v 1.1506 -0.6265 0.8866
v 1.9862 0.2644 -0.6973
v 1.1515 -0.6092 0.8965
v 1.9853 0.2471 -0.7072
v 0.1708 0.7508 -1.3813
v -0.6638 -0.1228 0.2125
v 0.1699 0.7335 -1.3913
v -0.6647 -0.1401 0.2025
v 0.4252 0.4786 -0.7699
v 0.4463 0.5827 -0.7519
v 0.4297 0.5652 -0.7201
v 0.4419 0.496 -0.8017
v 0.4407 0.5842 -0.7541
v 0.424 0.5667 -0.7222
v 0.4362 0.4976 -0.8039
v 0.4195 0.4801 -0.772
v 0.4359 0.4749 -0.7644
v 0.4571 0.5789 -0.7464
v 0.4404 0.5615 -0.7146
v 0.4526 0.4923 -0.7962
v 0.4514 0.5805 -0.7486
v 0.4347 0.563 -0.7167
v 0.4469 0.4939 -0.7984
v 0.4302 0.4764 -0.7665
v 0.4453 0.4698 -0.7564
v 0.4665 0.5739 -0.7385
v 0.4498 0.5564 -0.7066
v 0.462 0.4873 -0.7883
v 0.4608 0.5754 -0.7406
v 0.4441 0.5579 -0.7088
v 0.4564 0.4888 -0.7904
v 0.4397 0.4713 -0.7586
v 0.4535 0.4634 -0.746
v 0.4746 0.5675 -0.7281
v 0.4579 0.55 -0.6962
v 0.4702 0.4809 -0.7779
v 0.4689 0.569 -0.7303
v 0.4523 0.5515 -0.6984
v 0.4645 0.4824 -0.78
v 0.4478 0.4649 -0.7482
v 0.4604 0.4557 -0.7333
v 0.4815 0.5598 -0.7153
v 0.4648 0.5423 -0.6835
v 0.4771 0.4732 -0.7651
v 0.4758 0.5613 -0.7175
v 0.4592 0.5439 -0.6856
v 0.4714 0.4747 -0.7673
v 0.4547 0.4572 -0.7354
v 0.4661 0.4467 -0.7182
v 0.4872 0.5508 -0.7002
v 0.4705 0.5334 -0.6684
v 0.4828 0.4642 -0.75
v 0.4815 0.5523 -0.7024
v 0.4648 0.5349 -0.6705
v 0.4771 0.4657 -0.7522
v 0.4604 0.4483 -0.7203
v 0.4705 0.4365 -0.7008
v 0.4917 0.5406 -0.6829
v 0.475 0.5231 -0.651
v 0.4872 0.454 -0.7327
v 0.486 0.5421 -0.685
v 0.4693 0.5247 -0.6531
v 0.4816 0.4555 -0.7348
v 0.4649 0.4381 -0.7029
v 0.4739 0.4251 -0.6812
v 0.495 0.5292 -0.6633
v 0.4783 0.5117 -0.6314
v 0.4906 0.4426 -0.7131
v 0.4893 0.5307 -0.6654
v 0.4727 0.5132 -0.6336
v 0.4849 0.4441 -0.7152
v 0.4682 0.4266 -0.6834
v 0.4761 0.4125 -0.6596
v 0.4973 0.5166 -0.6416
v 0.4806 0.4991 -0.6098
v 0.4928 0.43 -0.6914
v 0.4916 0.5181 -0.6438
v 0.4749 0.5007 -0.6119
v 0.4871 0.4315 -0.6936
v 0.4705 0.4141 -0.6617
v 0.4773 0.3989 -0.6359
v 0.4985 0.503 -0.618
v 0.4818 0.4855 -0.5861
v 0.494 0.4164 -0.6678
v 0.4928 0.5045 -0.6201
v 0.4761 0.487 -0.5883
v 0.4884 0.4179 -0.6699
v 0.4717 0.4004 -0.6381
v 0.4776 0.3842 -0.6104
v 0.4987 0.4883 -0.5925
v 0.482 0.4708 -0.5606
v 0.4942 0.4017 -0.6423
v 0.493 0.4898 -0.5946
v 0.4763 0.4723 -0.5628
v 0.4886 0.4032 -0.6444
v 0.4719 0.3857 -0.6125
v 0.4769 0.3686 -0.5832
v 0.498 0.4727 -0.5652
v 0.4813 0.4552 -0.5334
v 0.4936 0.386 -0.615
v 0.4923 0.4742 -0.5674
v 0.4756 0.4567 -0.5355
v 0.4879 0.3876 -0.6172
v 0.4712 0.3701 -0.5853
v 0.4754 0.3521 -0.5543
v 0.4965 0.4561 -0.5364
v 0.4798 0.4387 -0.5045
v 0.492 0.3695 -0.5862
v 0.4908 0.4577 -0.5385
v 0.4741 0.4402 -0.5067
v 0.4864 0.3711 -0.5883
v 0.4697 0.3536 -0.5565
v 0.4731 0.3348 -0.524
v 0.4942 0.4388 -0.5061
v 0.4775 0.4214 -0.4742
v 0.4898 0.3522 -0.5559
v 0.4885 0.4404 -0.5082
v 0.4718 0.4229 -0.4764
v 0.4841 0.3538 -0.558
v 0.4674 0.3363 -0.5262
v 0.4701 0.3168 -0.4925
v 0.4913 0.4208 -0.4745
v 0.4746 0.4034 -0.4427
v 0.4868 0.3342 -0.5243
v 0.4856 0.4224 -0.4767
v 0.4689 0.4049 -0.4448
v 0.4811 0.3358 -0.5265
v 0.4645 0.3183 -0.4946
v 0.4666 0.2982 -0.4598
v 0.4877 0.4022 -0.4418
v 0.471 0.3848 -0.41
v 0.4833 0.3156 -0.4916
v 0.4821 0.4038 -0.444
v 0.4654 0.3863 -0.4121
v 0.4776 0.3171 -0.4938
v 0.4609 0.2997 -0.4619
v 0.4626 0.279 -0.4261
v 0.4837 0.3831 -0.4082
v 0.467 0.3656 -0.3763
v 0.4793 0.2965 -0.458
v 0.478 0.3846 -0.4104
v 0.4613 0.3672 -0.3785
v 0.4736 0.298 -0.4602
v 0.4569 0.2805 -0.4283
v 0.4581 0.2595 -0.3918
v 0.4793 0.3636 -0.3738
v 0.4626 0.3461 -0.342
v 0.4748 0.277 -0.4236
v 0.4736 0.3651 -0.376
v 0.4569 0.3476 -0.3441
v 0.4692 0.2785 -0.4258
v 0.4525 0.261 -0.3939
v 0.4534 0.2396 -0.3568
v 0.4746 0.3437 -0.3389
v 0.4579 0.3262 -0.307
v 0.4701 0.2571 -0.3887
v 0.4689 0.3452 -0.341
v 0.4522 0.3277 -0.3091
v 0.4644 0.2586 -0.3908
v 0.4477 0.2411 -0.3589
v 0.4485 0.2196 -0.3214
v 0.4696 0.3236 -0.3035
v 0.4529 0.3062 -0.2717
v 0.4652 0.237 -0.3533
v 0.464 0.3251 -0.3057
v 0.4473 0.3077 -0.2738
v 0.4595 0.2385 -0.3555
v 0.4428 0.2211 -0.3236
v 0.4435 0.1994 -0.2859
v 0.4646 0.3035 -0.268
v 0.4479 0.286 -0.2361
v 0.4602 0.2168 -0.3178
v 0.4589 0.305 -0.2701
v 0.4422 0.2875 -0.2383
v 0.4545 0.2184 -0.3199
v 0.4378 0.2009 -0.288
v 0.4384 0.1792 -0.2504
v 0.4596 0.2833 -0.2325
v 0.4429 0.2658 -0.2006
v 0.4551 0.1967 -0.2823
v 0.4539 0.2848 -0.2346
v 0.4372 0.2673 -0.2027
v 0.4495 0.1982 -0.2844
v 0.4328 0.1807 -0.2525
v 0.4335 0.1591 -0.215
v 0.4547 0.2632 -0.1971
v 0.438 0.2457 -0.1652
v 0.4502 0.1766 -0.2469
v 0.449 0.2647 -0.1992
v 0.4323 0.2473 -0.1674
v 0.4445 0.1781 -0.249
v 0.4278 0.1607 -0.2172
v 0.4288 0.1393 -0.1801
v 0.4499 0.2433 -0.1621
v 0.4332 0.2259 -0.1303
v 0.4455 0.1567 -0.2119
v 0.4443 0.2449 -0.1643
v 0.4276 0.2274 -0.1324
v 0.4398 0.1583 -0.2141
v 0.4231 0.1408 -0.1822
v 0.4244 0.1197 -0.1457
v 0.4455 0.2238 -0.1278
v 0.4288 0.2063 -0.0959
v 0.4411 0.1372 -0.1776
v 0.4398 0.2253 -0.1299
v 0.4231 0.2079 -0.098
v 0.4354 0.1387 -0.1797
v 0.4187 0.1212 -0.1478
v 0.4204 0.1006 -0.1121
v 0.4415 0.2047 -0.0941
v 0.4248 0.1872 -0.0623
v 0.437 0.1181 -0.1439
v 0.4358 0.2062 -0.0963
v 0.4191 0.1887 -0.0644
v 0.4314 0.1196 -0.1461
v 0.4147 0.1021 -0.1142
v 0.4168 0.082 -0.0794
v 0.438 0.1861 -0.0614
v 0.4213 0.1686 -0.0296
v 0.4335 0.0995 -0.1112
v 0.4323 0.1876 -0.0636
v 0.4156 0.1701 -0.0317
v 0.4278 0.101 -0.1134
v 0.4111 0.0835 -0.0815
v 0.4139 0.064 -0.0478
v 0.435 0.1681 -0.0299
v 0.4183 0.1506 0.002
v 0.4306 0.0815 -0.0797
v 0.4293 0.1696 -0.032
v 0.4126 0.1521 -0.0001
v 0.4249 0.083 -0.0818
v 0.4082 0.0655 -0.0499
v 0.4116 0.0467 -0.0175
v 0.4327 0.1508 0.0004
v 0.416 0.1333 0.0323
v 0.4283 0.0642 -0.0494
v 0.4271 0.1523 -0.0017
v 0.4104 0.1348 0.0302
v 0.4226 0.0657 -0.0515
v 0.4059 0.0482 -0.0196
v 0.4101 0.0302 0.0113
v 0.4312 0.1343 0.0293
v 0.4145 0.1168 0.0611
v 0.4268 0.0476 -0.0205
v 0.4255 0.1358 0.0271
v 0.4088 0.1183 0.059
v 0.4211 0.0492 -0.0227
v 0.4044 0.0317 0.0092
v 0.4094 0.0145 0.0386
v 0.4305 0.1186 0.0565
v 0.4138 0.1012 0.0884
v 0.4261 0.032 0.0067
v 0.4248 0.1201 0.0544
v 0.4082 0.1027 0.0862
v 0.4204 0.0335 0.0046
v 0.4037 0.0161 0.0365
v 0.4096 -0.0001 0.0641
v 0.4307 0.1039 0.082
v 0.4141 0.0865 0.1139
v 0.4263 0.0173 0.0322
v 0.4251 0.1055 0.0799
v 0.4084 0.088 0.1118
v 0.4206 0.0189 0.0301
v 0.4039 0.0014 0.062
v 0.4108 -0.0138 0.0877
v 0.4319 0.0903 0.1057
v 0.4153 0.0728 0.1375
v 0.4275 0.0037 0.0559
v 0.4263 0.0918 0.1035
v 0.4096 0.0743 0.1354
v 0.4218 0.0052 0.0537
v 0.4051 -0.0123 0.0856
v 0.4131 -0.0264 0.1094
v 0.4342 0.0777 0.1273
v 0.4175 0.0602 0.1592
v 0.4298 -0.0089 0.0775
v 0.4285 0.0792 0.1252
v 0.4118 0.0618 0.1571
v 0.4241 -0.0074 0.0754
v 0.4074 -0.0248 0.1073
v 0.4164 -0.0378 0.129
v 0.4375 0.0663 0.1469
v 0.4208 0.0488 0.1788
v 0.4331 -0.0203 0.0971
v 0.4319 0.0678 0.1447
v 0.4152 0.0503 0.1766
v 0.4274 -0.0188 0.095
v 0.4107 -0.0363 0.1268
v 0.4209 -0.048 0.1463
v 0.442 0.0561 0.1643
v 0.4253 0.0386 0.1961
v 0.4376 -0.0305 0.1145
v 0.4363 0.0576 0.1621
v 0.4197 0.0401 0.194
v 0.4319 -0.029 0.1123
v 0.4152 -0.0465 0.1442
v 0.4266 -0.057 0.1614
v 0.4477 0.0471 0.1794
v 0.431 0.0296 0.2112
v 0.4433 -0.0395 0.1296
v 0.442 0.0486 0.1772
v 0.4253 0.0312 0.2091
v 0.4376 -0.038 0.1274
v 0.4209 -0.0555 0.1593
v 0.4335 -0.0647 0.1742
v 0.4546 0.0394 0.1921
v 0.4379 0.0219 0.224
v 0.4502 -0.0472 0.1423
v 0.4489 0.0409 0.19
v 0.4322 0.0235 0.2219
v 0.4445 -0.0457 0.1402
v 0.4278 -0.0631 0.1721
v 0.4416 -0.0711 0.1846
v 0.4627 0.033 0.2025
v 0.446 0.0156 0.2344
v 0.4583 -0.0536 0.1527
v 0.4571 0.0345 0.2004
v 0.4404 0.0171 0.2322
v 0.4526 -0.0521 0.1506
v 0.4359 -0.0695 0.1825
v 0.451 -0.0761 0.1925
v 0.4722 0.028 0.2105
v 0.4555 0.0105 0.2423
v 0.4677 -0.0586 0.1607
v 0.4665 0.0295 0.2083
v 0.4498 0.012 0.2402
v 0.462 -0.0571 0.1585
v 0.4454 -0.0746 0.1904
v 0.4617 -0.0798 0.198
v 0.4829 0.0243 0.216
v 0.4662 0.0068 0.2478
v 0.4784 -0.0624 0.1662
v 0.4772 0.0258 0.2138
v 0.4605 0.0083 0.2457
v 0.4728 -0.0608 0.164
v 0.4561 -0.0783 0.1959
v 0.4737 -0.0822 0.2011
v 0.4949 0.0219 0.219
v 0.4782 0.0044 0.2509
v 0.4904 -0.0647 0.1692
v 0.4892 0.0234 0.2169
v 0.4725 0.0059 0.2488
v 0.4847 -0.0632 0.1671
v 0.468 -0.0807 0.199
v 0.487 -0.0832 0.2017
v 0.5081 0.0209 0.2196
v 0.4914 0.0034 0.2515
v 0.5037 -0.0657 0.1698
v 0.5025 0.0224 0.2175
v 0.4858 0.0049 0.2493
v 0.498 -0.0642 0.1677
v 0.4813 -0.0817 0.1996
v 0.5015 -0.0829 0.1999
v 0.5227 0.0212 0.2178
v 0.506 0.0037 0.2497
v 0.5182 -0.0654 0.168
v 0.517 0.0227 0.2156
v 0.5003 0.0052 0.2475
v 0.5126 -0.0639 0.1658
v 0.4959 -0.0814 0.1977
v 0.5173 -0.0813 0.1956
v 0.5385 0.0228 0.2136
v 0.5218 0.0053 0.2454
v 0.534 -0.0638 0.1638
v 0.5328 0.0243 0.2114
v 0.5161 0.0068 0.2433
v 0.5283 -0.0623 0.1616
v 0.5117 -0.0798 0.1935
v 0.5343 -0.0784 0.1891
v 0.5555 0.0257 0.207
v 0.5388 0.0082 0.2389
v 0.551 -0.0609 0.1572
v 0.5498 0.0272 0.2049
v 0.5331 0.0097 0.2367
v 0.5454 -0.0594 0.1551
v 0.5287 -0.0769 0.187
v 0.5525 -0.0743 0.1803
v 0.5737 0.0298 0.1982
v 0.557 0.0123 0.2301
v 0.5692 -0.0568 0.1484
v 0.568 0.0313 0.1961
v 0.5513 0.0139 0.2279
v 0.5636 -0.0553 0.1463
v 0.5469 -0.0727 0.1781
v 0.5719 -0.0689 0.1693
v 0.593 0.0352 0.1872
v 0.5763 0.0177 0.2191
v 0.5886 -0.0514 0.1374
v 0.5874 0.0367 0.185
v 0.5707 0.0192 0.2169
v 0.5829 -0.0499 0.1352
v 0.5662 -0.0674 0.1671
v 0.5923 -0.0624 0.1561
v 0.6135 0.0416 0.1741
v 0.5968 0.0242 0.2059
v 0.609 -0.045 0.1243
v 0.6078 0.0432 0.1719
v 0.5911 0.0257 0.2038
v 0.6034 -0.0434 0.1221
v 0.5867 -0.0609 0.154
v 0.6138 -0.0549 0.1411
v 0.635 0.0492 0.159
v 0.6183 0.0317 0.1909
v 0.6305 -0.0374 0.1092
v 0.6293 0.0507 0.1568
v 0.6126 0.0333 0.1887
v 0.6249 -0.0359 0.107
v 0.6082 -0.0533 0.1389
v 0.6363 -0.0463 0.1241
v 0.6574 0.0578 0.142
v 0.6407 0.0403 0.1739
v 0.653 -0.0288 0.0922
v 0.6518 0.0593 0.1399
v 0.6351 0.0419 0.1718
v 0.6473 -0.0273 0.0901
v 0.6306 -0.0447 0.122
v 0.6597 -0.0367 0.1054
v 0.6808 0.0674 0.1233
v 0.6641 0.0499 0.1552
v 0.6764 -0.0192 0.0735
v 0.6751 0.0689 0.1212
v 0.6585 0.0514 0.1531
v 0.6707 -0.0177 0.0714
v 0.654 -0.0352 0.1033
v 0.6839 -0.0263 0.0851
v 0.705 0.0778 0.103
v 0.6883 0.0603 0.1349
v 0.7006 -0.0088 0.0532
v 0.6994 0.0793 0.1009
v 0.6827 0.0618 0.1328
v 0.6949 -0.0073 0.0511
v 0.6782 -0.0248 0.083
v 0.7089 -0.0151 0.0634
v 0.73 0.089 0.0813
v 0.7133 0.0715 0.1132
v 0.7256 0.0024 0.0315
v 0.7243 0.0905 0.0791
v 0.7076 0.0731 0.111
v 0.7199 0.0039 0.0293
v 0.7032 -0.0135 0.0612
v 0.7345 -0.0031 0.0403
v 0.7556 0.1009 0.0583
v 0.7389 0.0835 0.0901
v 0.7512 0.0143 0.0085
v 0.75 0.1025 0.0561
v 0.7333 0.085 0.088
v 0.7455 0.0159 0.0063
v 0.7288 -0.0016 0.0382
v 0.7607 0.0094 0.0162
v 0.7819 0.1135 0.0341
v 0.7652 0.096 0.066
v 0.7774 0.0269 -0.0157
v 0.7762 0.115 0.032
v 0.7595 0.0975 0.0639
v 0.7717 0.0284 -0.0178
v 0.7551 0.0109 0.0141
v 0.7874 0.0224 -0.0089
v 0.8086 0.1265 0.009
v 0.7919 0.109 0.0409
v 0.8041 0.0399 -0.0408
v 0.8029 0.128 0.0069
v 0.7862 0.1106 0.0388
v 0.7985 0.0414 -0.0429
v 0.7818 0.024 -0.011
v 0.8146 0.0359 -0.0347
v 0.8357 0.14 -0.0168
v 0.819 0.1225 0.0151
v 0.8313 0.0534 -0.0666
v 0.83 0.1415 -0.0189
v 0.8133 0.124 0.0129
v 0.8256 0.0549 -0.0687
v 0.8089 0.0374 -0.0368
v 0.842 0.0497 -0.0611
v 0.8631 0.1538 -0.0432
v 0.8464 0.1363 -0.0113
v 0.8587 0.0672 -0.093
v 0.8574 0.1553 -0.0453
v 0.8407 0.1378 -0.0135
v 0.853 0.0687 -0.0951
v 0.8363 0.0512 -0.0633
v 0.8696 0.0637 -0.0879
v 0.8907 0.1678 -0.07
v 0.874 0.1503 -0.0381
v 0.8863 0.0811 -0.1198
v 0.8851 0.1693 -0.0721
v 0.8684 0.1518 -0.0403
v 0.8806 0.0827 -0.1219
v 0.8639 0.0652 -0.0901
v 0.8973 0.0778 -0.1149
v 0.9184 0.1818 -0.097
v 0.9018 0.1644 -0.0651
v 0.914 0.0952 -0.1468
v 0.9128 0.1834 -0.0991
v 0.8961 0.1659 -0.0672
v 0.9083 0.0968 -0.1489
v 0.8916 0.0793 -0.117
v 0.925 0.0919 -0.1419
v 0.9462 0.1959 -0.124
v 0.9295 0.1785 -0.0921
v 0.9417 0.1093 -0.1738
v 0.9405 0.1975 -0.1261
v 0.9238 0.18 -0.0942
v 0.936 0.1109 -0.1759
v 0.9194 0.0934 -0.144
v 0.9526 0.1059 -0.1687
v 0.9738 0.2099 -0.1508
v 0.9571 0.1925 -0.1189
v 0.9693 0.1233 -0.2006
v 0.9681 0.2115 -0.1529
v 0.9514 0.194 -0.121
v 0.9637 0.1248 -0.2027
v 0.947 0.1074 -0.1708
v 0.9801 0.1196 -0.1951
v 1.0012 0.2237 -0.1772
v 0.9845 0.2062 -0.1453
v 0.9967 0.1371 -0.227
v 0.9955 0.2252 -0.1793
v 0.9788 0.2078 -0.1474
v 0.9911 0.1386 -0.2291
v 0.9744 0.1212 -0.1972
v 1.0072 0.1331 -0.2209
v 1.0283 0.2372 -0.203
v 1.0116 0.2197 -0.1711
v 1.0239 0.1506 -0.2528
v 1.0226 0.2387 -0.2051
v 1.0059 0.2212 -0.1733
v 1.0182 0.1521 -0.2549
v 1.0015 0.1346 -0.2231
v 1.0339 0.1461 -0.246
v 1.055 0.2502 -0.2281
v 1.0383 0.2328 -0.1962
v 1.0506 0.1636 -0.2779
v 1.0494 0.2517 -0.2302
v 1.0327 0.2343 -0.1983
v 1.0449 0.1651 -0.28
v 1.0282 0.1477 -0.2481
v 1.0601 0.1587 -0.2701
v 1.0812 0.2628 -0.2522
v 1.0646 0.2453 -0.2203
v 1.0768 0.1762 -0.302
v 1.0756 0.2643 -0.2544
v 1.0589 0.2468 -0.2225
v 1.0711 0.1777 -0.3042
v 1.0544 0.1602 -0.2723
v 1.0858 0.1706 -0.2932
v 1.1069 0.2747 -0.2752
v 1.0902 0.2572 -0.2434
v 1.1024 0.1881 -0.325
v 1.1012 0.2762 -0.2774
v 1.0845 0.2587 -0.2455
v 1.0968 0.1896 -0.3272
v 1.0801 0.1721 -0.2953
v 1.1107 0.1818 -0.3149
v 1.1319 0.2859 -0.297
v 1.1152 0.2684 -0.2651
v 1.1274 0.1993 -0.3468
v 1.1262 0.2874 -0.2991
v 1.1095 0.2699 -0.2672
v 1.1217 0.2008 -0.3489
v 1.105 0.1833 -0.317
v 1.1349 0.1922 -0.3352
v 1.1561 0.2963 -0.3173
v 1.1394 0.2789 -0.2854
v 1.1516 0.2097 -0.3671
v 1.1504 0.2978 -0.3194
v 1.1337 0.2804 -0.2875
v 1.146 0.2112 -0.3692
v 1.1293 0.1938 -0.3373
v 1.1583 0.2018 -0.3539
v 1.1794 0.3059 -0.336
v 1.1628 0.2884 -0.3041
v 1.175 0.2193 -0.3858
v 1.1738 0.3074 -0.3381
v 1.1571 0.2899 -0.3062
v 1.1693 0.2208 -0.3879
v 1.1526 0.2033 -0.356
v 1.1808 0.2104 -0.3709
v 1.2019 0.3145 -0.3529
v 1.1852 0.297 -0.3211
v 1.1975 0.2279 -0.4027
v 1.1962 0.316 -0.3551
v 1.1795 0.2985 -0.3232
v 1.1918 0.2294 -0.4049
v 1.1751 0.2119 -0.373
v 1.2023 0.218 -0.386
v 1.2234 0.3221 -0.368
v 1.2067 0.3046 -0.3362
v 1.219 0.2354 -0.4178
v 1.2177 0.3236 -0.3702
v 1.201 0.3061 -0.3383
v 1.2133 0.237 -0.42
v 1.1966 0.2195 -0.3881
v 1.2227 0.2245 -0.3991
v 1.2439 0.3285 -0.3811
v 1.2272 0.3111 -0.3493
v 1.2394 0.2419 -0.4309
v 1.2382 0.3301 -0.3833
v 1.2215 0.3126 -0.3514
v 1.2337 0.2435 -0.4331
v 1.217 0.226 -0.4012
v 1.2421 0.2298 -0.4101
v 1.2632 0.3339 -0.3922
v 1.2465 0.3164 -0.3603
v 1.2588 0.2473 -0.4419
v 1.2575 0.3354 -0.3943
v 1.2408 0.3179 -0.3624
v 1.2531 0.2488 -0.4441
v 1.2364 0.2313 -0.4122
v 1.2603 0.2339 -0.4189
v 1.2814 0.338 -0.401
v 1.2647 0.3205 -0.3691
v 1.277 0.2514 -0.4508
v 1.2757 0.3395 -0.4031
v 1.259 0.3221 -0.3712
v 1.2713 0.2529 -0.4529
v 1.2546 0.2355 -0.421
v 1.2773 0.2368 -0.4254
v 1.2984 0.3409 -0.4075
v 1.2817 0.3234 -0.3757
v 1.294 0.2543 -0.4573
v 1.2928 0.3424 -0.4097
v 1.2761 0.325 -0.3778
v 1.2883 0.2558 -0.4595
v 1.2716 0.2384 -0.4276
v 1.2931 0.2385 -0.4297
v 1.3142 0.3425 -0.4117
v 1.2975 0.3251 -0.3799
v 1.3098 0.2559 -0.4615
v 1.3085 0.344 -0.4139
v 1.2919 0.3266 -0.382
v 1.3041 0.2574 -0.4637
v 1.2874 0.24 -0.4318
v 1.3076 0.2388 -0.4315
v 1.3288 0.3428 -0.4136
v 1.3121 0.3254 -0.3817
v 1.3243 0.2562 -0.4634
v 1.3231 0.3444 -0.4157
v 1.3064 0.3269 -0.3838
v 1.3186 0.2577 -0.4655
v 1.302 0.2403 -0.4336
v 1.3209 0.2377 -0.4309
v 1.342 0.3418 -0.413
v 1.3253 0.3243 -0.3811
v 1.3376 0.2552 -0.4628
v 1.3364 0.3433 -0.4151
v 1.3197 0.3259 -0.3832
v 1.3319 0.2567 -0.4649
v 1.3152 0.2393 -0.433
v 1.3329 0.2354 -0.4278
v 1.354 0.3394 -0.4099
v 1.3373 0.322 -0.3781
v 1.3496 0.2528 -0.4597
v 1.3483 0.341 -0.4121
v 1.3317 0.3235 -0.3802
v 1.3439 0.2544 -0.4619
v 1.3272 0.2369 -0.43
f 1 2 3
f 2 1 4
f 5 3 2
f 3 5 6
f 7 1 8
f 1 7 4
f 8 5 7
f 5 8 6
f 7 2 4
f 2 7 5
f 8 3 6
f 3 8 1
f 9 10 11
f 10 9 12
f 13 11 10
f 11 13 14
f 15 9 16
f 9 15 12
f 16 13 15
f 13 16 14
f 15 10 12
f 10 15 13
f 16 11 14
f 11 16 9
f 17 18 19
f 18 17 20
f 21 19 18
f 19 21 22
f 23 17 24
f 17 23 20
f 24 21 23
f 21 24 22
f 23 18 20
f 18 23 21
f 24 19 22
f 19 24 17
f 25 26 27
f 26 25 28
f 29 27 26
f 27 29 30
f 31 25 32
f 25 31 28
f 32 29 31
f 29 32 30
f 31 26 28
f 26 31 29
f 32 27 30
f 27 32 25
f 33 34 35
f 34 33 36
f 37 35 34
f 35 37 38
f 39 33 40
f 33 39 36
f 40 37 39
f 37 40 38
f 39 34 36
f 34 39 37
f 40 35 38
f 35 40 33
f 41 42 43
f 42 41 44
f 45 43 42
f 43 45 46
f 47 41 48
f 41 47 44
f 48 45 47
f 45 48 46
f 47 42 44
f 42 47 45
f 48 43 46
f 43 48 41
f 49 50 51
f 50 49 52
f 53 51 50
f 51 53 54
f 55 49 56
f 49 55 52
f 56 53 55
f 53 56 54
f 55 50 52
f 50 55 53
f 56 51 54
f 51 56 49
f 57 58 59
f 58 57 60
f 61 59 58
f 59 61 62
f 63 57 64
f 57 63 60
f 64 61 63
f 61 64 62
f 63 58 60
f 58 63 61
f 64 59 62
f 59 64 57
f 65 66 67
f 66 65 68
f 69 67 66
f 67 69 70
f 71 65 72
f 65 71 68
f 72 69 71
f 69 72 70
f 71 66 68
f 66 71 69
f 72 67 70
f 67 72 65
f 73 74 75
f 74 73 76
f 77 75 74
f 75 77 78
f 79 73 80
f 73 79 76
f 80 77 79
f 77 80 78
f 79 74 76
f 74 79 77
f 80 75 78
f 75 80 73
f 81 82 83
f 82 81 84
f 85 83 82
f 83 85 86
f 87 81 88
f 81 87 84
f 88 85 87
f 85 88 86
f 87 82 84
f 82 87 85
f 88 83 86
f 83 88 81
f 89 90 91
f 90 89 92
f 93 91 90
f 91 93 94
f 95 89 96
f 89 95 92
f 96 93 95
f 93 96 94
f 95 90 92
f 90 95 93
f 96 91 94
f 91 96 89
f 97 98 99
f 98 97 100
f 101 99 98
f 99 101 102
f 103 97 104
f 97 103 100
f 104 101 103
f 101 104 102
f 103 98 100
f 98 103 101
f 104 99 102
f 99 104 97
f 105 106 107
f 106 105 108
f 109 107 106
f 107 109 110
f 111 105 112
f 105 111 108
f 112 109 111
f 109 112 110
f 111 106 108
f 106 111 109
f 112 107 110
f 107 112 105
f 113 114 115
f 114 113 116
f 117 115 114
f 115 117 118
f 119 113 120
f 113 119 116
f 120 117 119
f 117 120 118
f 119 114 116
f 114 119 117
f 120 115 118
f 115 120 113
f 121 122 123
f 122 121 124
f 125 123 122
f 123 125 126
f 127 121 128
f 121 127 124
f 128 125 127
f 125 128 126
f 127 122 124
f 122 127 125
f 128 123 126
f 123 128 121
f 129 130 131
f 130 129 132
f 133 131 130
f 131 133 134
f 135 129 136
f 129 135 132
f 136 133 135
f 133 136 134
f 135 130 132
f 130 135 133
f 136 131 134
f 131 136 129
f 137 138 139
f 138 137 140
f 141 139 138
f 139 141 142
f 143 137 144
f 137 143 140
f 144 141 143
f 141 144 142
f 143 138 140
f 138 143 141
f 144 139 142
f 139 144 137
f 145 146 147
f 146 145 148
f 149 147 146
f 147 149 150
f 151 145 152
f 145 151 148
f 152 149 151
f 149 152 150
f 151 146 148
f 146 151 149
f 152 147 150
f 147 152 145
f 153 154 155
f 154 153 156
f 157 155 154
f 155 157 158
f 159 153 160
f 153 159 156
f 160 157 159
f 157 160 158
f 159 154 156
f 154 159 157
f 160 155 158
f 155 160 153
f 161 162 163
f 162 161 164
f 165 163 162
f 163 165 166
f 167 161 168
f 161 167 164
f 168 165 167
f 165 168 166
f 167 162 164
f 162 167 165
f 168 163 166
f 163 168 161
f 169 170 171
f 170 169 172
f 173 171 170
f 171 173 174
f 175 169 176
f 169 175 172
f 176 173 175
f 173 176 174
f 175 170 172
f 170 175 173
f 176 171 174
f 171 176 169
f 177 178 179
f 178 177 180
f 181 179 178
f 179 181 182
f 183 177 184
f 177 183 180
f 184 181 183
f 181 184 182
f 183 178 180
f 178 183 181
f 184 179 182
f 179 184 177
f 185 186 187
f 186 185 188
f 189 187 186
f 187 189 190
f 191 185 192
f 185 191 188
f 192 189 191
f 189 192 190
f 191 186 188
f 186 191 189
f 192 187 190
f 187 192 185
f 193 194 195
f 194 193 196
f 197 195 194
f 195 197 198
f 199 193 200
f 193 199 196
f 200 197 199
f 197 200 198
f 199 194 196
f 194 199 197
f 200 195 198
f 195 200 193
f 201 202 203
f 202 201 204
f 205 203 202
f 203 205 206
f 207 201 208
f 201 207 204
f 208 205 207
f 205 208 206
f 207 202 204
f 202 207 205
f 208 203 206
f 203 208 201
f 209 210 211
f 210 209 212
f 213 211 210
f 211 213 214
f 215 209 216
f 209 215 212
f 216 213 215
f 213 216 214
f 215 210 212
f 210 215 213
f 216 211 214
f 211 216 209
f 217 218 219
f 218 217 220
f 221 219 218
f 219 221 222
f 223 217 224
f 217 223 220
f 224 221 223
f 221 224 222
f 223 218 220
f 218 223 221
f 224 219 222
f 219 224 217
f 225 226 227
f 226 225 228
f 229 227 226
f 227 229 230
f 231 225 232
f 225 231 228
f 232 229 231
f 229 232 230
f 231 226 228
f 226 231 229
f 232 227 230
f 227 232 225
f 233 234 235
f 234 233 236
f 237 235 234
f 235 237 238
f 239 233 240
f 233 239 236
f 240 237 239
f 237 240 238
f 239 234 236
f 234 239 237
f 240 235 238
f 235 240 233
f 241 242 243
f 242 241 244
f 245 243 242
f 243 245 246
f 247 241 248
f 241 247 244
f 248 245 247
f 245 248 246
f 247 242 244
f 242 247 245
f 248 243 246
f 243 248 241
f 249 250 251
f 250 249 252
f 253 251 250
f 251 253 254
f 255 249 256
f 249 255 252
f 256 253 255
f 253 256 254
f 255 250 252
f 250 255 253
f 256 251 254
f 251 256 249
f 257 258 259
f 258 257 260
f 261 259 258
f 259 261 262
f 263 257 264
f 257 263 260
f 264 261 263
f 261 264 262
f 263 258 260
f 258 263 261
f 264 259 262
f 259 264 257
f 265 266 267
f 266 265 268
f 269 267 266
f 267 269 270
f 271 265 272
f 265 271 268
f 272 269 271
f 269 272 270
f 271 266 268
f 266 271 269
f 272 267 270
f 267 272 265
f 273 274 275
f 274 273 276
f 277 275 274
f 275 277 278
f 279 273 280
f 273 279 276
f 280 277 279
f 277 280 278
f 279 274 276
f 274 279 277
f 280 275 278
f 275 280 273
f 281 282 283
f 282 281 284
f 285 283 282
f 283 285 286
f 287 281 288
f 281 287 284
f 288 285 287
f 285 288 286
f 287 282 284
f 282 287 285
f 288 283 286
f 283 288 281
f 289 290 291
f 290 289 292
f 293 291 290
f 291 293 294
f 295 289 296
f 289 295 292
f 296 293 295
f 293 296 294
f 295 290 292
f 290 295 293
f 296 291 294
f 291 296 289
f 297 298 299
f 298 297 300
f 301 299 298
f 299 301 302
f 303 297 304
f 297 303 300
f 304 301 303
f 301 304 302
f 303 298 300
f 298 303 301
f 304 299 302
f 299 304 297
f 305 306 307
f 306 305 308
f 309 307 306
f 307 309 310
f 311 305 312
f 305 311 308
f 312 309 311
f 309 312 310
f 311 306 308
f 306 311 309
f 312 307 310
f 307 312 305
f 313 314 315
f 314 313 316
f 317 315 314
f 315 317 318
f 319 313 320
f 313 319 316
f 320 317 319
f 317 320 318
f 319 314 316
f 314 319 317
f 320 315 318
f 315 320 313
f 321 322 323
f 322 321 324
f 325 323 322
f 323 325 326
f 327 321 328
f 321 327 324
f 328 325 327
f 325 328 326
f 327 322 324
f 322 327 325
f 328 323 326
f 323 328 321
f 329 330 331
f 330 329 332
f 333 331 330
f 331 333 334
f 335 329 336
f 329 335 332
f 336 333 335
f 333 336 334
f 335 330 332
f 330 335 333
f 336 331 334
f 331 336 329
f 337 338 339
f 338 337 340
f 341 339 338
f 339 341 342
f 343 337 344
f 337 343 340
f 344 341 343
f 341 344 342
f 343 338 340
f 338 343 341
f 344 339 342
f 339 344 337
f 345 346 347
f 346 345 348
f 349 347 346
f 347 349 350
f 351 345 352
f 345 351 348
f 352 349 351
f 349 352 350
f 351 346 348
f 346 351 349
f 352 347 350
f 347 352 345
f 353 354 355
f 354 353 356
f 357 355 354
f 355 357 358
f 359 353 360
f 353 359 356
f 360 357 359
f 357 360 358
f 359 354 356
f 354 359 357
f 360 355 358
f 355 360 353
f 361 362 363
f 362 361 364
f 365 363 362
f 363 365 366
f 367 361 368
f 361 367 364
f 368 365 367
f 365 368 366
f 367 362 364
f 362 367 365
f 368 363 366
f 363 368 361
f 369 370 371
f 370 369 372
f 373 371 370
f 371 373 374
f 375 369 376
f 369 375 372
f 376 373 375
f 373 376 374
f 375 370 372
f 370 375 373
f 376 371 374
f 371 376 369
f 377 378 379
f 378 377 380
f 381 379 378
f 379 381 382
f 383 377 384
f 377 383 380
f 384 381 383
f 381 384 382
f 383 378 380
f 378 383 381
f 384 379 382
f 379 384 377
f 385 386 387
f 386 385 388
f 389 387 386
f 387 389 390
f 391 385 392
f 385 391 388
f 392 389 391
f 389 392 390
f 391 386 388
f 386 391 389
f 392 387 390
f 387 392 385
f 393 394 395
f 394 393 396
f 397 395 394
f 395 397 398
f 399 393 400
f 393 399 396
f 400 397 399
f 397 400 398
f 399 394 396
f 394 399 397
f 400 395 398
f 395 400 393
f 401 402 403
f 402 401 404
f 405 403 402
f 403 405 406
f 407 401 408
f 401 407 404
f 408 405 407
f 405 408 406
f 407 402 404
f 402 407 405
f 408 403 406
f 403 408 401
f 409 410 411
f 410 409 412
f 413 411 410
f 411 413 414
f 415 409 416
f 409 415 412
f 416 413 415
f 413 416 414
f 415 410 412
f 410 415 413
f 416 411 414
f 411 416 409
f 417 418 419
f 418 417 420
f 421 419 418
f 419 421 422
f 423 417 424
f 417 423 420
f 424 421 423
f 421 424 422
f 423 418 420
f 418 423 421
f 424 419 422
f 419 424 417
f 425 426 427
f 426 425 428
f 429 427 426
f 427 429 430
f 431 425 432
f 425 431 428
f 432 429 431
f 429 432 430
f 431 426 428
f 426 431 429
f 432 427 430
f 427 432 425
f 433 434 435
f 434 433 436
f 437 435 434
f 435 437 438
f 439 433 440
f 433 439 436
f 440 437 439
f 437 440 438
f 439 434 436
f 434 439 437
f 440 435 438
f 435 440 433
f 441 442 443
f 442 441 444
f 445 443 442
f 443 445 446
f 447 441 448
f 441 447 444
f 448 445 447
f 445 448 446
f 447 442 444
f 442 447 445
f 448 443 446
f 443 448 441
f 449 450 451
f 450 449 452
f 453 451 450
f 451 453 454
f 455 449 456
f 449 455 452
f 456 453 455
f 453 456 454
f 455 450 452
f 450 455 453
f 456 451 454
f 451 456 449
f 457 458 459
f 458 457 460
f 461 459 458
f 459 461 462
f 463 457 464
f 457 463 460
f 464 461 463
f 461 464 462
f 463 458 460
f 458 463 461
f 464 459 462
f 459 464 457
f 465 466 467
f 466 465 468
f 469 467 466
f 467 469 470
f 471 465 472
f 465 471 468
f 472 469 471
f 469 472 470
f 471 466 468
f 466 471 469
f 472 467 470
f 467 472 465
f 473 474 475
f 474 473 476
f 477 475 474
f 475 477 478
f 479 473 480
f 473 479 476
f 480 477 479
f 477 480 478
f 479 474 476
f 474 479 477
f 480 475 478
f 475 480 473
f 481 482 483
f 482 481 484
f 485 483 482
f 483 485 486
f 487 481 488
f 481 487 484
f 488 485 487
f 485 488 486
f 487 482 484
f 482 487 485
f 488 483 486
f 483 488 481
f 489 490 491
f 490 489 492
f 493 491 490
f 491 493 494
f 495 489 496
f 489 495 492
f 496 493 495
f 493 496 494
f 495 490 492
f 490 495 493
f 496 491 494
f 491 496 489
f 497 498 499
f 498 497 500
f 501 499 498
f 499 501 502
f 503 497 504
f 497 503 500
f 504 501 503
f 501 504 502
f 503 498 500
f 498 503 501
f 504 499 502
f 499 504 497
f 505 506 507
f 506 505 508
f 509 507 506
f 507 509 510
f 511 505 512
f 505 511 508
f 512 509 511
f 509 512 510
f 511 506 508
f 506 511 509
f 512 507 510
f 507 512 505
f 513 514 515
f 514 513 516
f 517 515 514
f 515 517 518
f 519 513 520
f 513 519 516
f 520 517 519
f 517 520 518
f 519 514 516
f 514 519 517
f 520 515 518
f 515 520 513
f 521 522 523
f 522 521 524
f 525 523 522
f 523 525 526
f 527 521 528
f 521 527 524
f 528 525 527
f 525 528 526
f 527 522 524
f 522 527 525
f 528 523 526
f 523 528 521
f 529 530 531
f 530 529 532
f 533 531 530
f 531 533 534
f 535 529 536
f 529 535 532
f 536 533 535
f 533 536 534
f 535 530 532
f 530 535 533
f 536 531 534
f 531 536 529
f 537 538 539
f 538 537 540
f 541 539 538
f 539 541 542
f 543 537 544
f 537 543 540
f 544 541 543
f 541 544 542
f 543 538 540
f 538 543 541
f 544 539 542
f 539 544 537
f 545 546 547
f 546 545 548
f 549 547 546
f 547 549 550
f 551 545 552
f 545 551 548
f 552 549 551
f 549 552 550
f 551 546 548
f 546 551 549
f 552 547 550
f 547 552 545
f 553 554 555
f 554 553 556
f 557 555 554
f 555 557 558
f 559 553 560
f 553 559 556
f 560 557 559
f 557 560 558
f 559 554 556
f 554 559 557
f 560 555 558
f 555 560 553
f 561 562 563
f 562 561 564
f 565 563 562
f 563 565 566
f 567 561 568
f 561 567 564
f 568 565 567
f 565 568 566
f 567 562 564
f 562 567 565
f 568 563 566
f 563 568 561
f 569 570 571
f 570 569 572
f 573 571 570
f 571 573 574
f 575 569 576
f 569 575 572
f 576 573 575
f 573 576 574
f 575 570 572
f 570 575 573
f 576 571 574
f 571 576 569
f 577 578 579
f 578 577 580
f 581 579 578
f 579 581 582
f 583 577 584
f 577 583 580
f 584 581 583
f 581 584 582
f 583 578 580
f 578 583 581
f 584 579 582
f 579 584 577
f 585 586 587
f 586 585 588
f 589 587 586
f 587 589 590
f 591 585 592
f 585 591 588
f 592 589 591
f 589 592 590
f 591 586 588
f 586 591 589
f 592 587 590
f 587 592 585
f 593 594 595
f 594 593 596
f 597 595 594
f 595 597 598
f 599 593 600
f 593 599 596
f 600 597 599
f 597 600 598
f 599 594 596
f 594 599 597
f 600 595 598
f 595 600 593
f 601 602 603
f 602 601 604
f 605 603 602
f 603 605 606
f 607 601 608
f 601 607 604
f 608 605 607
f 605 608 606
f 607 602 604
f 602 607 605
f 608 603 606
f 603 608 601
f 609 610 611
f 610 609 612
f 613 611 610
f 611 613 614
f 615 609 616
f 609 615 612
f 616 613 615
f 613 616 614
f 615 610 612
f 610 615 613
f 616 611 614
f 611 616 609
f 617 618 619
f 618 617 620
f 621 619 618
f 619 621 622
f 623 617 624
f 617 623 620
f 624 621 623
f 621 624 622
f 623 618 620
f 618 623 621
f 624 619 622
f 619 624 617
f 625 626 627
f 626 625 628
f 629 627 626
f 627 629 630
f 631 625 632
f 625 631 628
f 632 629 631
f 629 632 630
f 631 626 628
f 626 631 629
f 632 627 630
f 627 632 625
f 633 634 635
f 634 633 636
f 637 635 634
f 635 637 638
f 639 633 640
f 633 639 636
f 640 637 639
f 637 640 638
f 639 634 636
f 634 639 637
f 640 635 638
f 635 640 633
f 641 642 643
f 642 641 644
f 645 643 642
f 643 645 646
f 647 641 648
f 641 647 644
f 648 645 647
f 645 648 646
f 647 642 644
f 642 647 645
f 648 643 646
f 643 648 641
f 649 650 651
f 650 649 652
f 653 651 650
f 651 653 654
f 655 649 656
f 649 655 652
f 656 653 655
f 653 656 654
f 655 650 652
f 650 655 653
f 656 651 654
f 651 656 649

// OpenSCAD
//  OpenScad code generated from OSKAR python.
//  OSKAR Compiler written by Bryce Summers for Larry Cuba
//  Compiled on June 12, 2017
$fn=130;
$vpr = [0, 0, 0];   // vpr system variable
$vpd = 6.0;         // vpd system variable
$vpt = [0, 0, 0];   // vpt system variable


function modulo(dividend, divisor) =
   dividend % divisor;

// return 0, divisor, 2*divisor, etc based on which interval x is in.
function step(x, divisor) = 
    floor(x/divisor)*divisor;

function myTY1(x, time) = 
   cos((x*360)+(time*360));

module floor()
{
   Global_t = $t;
   steps = 1;
   step_size = 1.0/steps;
   // Iteration from 0 to 1 in 1 equal steps.
   for (i=[0:step_size:1])
   {
      translate([-.5, -.5, -.05])
      scale([2, 2, .02])
      color([1, 1, 1, 1])
      cube();
   }
}
module cosine()
{
   Global_t = $t;
   steps = 80;
   step_size = 1.0/steps;
   // Iteration from 0 to 1 in 80 equal steps.
   for (i=[0:step_size:1])
   {
      translate([0, .5, 0])
      scale([1, .5, 1])
      translate([i, myTY1 ( i , Global_t ), .05])
      scale([.5, 4, 5])
      scale([.0125, .02, .02])
      color([1, 1, 1, 1])
      cube();
   }
}
module draw()
{
      floor();
      cosine();
}

// Draw the root module.
translate([0, 0, 0])rotate([-58,-20, -15]) //set POV
draw();
